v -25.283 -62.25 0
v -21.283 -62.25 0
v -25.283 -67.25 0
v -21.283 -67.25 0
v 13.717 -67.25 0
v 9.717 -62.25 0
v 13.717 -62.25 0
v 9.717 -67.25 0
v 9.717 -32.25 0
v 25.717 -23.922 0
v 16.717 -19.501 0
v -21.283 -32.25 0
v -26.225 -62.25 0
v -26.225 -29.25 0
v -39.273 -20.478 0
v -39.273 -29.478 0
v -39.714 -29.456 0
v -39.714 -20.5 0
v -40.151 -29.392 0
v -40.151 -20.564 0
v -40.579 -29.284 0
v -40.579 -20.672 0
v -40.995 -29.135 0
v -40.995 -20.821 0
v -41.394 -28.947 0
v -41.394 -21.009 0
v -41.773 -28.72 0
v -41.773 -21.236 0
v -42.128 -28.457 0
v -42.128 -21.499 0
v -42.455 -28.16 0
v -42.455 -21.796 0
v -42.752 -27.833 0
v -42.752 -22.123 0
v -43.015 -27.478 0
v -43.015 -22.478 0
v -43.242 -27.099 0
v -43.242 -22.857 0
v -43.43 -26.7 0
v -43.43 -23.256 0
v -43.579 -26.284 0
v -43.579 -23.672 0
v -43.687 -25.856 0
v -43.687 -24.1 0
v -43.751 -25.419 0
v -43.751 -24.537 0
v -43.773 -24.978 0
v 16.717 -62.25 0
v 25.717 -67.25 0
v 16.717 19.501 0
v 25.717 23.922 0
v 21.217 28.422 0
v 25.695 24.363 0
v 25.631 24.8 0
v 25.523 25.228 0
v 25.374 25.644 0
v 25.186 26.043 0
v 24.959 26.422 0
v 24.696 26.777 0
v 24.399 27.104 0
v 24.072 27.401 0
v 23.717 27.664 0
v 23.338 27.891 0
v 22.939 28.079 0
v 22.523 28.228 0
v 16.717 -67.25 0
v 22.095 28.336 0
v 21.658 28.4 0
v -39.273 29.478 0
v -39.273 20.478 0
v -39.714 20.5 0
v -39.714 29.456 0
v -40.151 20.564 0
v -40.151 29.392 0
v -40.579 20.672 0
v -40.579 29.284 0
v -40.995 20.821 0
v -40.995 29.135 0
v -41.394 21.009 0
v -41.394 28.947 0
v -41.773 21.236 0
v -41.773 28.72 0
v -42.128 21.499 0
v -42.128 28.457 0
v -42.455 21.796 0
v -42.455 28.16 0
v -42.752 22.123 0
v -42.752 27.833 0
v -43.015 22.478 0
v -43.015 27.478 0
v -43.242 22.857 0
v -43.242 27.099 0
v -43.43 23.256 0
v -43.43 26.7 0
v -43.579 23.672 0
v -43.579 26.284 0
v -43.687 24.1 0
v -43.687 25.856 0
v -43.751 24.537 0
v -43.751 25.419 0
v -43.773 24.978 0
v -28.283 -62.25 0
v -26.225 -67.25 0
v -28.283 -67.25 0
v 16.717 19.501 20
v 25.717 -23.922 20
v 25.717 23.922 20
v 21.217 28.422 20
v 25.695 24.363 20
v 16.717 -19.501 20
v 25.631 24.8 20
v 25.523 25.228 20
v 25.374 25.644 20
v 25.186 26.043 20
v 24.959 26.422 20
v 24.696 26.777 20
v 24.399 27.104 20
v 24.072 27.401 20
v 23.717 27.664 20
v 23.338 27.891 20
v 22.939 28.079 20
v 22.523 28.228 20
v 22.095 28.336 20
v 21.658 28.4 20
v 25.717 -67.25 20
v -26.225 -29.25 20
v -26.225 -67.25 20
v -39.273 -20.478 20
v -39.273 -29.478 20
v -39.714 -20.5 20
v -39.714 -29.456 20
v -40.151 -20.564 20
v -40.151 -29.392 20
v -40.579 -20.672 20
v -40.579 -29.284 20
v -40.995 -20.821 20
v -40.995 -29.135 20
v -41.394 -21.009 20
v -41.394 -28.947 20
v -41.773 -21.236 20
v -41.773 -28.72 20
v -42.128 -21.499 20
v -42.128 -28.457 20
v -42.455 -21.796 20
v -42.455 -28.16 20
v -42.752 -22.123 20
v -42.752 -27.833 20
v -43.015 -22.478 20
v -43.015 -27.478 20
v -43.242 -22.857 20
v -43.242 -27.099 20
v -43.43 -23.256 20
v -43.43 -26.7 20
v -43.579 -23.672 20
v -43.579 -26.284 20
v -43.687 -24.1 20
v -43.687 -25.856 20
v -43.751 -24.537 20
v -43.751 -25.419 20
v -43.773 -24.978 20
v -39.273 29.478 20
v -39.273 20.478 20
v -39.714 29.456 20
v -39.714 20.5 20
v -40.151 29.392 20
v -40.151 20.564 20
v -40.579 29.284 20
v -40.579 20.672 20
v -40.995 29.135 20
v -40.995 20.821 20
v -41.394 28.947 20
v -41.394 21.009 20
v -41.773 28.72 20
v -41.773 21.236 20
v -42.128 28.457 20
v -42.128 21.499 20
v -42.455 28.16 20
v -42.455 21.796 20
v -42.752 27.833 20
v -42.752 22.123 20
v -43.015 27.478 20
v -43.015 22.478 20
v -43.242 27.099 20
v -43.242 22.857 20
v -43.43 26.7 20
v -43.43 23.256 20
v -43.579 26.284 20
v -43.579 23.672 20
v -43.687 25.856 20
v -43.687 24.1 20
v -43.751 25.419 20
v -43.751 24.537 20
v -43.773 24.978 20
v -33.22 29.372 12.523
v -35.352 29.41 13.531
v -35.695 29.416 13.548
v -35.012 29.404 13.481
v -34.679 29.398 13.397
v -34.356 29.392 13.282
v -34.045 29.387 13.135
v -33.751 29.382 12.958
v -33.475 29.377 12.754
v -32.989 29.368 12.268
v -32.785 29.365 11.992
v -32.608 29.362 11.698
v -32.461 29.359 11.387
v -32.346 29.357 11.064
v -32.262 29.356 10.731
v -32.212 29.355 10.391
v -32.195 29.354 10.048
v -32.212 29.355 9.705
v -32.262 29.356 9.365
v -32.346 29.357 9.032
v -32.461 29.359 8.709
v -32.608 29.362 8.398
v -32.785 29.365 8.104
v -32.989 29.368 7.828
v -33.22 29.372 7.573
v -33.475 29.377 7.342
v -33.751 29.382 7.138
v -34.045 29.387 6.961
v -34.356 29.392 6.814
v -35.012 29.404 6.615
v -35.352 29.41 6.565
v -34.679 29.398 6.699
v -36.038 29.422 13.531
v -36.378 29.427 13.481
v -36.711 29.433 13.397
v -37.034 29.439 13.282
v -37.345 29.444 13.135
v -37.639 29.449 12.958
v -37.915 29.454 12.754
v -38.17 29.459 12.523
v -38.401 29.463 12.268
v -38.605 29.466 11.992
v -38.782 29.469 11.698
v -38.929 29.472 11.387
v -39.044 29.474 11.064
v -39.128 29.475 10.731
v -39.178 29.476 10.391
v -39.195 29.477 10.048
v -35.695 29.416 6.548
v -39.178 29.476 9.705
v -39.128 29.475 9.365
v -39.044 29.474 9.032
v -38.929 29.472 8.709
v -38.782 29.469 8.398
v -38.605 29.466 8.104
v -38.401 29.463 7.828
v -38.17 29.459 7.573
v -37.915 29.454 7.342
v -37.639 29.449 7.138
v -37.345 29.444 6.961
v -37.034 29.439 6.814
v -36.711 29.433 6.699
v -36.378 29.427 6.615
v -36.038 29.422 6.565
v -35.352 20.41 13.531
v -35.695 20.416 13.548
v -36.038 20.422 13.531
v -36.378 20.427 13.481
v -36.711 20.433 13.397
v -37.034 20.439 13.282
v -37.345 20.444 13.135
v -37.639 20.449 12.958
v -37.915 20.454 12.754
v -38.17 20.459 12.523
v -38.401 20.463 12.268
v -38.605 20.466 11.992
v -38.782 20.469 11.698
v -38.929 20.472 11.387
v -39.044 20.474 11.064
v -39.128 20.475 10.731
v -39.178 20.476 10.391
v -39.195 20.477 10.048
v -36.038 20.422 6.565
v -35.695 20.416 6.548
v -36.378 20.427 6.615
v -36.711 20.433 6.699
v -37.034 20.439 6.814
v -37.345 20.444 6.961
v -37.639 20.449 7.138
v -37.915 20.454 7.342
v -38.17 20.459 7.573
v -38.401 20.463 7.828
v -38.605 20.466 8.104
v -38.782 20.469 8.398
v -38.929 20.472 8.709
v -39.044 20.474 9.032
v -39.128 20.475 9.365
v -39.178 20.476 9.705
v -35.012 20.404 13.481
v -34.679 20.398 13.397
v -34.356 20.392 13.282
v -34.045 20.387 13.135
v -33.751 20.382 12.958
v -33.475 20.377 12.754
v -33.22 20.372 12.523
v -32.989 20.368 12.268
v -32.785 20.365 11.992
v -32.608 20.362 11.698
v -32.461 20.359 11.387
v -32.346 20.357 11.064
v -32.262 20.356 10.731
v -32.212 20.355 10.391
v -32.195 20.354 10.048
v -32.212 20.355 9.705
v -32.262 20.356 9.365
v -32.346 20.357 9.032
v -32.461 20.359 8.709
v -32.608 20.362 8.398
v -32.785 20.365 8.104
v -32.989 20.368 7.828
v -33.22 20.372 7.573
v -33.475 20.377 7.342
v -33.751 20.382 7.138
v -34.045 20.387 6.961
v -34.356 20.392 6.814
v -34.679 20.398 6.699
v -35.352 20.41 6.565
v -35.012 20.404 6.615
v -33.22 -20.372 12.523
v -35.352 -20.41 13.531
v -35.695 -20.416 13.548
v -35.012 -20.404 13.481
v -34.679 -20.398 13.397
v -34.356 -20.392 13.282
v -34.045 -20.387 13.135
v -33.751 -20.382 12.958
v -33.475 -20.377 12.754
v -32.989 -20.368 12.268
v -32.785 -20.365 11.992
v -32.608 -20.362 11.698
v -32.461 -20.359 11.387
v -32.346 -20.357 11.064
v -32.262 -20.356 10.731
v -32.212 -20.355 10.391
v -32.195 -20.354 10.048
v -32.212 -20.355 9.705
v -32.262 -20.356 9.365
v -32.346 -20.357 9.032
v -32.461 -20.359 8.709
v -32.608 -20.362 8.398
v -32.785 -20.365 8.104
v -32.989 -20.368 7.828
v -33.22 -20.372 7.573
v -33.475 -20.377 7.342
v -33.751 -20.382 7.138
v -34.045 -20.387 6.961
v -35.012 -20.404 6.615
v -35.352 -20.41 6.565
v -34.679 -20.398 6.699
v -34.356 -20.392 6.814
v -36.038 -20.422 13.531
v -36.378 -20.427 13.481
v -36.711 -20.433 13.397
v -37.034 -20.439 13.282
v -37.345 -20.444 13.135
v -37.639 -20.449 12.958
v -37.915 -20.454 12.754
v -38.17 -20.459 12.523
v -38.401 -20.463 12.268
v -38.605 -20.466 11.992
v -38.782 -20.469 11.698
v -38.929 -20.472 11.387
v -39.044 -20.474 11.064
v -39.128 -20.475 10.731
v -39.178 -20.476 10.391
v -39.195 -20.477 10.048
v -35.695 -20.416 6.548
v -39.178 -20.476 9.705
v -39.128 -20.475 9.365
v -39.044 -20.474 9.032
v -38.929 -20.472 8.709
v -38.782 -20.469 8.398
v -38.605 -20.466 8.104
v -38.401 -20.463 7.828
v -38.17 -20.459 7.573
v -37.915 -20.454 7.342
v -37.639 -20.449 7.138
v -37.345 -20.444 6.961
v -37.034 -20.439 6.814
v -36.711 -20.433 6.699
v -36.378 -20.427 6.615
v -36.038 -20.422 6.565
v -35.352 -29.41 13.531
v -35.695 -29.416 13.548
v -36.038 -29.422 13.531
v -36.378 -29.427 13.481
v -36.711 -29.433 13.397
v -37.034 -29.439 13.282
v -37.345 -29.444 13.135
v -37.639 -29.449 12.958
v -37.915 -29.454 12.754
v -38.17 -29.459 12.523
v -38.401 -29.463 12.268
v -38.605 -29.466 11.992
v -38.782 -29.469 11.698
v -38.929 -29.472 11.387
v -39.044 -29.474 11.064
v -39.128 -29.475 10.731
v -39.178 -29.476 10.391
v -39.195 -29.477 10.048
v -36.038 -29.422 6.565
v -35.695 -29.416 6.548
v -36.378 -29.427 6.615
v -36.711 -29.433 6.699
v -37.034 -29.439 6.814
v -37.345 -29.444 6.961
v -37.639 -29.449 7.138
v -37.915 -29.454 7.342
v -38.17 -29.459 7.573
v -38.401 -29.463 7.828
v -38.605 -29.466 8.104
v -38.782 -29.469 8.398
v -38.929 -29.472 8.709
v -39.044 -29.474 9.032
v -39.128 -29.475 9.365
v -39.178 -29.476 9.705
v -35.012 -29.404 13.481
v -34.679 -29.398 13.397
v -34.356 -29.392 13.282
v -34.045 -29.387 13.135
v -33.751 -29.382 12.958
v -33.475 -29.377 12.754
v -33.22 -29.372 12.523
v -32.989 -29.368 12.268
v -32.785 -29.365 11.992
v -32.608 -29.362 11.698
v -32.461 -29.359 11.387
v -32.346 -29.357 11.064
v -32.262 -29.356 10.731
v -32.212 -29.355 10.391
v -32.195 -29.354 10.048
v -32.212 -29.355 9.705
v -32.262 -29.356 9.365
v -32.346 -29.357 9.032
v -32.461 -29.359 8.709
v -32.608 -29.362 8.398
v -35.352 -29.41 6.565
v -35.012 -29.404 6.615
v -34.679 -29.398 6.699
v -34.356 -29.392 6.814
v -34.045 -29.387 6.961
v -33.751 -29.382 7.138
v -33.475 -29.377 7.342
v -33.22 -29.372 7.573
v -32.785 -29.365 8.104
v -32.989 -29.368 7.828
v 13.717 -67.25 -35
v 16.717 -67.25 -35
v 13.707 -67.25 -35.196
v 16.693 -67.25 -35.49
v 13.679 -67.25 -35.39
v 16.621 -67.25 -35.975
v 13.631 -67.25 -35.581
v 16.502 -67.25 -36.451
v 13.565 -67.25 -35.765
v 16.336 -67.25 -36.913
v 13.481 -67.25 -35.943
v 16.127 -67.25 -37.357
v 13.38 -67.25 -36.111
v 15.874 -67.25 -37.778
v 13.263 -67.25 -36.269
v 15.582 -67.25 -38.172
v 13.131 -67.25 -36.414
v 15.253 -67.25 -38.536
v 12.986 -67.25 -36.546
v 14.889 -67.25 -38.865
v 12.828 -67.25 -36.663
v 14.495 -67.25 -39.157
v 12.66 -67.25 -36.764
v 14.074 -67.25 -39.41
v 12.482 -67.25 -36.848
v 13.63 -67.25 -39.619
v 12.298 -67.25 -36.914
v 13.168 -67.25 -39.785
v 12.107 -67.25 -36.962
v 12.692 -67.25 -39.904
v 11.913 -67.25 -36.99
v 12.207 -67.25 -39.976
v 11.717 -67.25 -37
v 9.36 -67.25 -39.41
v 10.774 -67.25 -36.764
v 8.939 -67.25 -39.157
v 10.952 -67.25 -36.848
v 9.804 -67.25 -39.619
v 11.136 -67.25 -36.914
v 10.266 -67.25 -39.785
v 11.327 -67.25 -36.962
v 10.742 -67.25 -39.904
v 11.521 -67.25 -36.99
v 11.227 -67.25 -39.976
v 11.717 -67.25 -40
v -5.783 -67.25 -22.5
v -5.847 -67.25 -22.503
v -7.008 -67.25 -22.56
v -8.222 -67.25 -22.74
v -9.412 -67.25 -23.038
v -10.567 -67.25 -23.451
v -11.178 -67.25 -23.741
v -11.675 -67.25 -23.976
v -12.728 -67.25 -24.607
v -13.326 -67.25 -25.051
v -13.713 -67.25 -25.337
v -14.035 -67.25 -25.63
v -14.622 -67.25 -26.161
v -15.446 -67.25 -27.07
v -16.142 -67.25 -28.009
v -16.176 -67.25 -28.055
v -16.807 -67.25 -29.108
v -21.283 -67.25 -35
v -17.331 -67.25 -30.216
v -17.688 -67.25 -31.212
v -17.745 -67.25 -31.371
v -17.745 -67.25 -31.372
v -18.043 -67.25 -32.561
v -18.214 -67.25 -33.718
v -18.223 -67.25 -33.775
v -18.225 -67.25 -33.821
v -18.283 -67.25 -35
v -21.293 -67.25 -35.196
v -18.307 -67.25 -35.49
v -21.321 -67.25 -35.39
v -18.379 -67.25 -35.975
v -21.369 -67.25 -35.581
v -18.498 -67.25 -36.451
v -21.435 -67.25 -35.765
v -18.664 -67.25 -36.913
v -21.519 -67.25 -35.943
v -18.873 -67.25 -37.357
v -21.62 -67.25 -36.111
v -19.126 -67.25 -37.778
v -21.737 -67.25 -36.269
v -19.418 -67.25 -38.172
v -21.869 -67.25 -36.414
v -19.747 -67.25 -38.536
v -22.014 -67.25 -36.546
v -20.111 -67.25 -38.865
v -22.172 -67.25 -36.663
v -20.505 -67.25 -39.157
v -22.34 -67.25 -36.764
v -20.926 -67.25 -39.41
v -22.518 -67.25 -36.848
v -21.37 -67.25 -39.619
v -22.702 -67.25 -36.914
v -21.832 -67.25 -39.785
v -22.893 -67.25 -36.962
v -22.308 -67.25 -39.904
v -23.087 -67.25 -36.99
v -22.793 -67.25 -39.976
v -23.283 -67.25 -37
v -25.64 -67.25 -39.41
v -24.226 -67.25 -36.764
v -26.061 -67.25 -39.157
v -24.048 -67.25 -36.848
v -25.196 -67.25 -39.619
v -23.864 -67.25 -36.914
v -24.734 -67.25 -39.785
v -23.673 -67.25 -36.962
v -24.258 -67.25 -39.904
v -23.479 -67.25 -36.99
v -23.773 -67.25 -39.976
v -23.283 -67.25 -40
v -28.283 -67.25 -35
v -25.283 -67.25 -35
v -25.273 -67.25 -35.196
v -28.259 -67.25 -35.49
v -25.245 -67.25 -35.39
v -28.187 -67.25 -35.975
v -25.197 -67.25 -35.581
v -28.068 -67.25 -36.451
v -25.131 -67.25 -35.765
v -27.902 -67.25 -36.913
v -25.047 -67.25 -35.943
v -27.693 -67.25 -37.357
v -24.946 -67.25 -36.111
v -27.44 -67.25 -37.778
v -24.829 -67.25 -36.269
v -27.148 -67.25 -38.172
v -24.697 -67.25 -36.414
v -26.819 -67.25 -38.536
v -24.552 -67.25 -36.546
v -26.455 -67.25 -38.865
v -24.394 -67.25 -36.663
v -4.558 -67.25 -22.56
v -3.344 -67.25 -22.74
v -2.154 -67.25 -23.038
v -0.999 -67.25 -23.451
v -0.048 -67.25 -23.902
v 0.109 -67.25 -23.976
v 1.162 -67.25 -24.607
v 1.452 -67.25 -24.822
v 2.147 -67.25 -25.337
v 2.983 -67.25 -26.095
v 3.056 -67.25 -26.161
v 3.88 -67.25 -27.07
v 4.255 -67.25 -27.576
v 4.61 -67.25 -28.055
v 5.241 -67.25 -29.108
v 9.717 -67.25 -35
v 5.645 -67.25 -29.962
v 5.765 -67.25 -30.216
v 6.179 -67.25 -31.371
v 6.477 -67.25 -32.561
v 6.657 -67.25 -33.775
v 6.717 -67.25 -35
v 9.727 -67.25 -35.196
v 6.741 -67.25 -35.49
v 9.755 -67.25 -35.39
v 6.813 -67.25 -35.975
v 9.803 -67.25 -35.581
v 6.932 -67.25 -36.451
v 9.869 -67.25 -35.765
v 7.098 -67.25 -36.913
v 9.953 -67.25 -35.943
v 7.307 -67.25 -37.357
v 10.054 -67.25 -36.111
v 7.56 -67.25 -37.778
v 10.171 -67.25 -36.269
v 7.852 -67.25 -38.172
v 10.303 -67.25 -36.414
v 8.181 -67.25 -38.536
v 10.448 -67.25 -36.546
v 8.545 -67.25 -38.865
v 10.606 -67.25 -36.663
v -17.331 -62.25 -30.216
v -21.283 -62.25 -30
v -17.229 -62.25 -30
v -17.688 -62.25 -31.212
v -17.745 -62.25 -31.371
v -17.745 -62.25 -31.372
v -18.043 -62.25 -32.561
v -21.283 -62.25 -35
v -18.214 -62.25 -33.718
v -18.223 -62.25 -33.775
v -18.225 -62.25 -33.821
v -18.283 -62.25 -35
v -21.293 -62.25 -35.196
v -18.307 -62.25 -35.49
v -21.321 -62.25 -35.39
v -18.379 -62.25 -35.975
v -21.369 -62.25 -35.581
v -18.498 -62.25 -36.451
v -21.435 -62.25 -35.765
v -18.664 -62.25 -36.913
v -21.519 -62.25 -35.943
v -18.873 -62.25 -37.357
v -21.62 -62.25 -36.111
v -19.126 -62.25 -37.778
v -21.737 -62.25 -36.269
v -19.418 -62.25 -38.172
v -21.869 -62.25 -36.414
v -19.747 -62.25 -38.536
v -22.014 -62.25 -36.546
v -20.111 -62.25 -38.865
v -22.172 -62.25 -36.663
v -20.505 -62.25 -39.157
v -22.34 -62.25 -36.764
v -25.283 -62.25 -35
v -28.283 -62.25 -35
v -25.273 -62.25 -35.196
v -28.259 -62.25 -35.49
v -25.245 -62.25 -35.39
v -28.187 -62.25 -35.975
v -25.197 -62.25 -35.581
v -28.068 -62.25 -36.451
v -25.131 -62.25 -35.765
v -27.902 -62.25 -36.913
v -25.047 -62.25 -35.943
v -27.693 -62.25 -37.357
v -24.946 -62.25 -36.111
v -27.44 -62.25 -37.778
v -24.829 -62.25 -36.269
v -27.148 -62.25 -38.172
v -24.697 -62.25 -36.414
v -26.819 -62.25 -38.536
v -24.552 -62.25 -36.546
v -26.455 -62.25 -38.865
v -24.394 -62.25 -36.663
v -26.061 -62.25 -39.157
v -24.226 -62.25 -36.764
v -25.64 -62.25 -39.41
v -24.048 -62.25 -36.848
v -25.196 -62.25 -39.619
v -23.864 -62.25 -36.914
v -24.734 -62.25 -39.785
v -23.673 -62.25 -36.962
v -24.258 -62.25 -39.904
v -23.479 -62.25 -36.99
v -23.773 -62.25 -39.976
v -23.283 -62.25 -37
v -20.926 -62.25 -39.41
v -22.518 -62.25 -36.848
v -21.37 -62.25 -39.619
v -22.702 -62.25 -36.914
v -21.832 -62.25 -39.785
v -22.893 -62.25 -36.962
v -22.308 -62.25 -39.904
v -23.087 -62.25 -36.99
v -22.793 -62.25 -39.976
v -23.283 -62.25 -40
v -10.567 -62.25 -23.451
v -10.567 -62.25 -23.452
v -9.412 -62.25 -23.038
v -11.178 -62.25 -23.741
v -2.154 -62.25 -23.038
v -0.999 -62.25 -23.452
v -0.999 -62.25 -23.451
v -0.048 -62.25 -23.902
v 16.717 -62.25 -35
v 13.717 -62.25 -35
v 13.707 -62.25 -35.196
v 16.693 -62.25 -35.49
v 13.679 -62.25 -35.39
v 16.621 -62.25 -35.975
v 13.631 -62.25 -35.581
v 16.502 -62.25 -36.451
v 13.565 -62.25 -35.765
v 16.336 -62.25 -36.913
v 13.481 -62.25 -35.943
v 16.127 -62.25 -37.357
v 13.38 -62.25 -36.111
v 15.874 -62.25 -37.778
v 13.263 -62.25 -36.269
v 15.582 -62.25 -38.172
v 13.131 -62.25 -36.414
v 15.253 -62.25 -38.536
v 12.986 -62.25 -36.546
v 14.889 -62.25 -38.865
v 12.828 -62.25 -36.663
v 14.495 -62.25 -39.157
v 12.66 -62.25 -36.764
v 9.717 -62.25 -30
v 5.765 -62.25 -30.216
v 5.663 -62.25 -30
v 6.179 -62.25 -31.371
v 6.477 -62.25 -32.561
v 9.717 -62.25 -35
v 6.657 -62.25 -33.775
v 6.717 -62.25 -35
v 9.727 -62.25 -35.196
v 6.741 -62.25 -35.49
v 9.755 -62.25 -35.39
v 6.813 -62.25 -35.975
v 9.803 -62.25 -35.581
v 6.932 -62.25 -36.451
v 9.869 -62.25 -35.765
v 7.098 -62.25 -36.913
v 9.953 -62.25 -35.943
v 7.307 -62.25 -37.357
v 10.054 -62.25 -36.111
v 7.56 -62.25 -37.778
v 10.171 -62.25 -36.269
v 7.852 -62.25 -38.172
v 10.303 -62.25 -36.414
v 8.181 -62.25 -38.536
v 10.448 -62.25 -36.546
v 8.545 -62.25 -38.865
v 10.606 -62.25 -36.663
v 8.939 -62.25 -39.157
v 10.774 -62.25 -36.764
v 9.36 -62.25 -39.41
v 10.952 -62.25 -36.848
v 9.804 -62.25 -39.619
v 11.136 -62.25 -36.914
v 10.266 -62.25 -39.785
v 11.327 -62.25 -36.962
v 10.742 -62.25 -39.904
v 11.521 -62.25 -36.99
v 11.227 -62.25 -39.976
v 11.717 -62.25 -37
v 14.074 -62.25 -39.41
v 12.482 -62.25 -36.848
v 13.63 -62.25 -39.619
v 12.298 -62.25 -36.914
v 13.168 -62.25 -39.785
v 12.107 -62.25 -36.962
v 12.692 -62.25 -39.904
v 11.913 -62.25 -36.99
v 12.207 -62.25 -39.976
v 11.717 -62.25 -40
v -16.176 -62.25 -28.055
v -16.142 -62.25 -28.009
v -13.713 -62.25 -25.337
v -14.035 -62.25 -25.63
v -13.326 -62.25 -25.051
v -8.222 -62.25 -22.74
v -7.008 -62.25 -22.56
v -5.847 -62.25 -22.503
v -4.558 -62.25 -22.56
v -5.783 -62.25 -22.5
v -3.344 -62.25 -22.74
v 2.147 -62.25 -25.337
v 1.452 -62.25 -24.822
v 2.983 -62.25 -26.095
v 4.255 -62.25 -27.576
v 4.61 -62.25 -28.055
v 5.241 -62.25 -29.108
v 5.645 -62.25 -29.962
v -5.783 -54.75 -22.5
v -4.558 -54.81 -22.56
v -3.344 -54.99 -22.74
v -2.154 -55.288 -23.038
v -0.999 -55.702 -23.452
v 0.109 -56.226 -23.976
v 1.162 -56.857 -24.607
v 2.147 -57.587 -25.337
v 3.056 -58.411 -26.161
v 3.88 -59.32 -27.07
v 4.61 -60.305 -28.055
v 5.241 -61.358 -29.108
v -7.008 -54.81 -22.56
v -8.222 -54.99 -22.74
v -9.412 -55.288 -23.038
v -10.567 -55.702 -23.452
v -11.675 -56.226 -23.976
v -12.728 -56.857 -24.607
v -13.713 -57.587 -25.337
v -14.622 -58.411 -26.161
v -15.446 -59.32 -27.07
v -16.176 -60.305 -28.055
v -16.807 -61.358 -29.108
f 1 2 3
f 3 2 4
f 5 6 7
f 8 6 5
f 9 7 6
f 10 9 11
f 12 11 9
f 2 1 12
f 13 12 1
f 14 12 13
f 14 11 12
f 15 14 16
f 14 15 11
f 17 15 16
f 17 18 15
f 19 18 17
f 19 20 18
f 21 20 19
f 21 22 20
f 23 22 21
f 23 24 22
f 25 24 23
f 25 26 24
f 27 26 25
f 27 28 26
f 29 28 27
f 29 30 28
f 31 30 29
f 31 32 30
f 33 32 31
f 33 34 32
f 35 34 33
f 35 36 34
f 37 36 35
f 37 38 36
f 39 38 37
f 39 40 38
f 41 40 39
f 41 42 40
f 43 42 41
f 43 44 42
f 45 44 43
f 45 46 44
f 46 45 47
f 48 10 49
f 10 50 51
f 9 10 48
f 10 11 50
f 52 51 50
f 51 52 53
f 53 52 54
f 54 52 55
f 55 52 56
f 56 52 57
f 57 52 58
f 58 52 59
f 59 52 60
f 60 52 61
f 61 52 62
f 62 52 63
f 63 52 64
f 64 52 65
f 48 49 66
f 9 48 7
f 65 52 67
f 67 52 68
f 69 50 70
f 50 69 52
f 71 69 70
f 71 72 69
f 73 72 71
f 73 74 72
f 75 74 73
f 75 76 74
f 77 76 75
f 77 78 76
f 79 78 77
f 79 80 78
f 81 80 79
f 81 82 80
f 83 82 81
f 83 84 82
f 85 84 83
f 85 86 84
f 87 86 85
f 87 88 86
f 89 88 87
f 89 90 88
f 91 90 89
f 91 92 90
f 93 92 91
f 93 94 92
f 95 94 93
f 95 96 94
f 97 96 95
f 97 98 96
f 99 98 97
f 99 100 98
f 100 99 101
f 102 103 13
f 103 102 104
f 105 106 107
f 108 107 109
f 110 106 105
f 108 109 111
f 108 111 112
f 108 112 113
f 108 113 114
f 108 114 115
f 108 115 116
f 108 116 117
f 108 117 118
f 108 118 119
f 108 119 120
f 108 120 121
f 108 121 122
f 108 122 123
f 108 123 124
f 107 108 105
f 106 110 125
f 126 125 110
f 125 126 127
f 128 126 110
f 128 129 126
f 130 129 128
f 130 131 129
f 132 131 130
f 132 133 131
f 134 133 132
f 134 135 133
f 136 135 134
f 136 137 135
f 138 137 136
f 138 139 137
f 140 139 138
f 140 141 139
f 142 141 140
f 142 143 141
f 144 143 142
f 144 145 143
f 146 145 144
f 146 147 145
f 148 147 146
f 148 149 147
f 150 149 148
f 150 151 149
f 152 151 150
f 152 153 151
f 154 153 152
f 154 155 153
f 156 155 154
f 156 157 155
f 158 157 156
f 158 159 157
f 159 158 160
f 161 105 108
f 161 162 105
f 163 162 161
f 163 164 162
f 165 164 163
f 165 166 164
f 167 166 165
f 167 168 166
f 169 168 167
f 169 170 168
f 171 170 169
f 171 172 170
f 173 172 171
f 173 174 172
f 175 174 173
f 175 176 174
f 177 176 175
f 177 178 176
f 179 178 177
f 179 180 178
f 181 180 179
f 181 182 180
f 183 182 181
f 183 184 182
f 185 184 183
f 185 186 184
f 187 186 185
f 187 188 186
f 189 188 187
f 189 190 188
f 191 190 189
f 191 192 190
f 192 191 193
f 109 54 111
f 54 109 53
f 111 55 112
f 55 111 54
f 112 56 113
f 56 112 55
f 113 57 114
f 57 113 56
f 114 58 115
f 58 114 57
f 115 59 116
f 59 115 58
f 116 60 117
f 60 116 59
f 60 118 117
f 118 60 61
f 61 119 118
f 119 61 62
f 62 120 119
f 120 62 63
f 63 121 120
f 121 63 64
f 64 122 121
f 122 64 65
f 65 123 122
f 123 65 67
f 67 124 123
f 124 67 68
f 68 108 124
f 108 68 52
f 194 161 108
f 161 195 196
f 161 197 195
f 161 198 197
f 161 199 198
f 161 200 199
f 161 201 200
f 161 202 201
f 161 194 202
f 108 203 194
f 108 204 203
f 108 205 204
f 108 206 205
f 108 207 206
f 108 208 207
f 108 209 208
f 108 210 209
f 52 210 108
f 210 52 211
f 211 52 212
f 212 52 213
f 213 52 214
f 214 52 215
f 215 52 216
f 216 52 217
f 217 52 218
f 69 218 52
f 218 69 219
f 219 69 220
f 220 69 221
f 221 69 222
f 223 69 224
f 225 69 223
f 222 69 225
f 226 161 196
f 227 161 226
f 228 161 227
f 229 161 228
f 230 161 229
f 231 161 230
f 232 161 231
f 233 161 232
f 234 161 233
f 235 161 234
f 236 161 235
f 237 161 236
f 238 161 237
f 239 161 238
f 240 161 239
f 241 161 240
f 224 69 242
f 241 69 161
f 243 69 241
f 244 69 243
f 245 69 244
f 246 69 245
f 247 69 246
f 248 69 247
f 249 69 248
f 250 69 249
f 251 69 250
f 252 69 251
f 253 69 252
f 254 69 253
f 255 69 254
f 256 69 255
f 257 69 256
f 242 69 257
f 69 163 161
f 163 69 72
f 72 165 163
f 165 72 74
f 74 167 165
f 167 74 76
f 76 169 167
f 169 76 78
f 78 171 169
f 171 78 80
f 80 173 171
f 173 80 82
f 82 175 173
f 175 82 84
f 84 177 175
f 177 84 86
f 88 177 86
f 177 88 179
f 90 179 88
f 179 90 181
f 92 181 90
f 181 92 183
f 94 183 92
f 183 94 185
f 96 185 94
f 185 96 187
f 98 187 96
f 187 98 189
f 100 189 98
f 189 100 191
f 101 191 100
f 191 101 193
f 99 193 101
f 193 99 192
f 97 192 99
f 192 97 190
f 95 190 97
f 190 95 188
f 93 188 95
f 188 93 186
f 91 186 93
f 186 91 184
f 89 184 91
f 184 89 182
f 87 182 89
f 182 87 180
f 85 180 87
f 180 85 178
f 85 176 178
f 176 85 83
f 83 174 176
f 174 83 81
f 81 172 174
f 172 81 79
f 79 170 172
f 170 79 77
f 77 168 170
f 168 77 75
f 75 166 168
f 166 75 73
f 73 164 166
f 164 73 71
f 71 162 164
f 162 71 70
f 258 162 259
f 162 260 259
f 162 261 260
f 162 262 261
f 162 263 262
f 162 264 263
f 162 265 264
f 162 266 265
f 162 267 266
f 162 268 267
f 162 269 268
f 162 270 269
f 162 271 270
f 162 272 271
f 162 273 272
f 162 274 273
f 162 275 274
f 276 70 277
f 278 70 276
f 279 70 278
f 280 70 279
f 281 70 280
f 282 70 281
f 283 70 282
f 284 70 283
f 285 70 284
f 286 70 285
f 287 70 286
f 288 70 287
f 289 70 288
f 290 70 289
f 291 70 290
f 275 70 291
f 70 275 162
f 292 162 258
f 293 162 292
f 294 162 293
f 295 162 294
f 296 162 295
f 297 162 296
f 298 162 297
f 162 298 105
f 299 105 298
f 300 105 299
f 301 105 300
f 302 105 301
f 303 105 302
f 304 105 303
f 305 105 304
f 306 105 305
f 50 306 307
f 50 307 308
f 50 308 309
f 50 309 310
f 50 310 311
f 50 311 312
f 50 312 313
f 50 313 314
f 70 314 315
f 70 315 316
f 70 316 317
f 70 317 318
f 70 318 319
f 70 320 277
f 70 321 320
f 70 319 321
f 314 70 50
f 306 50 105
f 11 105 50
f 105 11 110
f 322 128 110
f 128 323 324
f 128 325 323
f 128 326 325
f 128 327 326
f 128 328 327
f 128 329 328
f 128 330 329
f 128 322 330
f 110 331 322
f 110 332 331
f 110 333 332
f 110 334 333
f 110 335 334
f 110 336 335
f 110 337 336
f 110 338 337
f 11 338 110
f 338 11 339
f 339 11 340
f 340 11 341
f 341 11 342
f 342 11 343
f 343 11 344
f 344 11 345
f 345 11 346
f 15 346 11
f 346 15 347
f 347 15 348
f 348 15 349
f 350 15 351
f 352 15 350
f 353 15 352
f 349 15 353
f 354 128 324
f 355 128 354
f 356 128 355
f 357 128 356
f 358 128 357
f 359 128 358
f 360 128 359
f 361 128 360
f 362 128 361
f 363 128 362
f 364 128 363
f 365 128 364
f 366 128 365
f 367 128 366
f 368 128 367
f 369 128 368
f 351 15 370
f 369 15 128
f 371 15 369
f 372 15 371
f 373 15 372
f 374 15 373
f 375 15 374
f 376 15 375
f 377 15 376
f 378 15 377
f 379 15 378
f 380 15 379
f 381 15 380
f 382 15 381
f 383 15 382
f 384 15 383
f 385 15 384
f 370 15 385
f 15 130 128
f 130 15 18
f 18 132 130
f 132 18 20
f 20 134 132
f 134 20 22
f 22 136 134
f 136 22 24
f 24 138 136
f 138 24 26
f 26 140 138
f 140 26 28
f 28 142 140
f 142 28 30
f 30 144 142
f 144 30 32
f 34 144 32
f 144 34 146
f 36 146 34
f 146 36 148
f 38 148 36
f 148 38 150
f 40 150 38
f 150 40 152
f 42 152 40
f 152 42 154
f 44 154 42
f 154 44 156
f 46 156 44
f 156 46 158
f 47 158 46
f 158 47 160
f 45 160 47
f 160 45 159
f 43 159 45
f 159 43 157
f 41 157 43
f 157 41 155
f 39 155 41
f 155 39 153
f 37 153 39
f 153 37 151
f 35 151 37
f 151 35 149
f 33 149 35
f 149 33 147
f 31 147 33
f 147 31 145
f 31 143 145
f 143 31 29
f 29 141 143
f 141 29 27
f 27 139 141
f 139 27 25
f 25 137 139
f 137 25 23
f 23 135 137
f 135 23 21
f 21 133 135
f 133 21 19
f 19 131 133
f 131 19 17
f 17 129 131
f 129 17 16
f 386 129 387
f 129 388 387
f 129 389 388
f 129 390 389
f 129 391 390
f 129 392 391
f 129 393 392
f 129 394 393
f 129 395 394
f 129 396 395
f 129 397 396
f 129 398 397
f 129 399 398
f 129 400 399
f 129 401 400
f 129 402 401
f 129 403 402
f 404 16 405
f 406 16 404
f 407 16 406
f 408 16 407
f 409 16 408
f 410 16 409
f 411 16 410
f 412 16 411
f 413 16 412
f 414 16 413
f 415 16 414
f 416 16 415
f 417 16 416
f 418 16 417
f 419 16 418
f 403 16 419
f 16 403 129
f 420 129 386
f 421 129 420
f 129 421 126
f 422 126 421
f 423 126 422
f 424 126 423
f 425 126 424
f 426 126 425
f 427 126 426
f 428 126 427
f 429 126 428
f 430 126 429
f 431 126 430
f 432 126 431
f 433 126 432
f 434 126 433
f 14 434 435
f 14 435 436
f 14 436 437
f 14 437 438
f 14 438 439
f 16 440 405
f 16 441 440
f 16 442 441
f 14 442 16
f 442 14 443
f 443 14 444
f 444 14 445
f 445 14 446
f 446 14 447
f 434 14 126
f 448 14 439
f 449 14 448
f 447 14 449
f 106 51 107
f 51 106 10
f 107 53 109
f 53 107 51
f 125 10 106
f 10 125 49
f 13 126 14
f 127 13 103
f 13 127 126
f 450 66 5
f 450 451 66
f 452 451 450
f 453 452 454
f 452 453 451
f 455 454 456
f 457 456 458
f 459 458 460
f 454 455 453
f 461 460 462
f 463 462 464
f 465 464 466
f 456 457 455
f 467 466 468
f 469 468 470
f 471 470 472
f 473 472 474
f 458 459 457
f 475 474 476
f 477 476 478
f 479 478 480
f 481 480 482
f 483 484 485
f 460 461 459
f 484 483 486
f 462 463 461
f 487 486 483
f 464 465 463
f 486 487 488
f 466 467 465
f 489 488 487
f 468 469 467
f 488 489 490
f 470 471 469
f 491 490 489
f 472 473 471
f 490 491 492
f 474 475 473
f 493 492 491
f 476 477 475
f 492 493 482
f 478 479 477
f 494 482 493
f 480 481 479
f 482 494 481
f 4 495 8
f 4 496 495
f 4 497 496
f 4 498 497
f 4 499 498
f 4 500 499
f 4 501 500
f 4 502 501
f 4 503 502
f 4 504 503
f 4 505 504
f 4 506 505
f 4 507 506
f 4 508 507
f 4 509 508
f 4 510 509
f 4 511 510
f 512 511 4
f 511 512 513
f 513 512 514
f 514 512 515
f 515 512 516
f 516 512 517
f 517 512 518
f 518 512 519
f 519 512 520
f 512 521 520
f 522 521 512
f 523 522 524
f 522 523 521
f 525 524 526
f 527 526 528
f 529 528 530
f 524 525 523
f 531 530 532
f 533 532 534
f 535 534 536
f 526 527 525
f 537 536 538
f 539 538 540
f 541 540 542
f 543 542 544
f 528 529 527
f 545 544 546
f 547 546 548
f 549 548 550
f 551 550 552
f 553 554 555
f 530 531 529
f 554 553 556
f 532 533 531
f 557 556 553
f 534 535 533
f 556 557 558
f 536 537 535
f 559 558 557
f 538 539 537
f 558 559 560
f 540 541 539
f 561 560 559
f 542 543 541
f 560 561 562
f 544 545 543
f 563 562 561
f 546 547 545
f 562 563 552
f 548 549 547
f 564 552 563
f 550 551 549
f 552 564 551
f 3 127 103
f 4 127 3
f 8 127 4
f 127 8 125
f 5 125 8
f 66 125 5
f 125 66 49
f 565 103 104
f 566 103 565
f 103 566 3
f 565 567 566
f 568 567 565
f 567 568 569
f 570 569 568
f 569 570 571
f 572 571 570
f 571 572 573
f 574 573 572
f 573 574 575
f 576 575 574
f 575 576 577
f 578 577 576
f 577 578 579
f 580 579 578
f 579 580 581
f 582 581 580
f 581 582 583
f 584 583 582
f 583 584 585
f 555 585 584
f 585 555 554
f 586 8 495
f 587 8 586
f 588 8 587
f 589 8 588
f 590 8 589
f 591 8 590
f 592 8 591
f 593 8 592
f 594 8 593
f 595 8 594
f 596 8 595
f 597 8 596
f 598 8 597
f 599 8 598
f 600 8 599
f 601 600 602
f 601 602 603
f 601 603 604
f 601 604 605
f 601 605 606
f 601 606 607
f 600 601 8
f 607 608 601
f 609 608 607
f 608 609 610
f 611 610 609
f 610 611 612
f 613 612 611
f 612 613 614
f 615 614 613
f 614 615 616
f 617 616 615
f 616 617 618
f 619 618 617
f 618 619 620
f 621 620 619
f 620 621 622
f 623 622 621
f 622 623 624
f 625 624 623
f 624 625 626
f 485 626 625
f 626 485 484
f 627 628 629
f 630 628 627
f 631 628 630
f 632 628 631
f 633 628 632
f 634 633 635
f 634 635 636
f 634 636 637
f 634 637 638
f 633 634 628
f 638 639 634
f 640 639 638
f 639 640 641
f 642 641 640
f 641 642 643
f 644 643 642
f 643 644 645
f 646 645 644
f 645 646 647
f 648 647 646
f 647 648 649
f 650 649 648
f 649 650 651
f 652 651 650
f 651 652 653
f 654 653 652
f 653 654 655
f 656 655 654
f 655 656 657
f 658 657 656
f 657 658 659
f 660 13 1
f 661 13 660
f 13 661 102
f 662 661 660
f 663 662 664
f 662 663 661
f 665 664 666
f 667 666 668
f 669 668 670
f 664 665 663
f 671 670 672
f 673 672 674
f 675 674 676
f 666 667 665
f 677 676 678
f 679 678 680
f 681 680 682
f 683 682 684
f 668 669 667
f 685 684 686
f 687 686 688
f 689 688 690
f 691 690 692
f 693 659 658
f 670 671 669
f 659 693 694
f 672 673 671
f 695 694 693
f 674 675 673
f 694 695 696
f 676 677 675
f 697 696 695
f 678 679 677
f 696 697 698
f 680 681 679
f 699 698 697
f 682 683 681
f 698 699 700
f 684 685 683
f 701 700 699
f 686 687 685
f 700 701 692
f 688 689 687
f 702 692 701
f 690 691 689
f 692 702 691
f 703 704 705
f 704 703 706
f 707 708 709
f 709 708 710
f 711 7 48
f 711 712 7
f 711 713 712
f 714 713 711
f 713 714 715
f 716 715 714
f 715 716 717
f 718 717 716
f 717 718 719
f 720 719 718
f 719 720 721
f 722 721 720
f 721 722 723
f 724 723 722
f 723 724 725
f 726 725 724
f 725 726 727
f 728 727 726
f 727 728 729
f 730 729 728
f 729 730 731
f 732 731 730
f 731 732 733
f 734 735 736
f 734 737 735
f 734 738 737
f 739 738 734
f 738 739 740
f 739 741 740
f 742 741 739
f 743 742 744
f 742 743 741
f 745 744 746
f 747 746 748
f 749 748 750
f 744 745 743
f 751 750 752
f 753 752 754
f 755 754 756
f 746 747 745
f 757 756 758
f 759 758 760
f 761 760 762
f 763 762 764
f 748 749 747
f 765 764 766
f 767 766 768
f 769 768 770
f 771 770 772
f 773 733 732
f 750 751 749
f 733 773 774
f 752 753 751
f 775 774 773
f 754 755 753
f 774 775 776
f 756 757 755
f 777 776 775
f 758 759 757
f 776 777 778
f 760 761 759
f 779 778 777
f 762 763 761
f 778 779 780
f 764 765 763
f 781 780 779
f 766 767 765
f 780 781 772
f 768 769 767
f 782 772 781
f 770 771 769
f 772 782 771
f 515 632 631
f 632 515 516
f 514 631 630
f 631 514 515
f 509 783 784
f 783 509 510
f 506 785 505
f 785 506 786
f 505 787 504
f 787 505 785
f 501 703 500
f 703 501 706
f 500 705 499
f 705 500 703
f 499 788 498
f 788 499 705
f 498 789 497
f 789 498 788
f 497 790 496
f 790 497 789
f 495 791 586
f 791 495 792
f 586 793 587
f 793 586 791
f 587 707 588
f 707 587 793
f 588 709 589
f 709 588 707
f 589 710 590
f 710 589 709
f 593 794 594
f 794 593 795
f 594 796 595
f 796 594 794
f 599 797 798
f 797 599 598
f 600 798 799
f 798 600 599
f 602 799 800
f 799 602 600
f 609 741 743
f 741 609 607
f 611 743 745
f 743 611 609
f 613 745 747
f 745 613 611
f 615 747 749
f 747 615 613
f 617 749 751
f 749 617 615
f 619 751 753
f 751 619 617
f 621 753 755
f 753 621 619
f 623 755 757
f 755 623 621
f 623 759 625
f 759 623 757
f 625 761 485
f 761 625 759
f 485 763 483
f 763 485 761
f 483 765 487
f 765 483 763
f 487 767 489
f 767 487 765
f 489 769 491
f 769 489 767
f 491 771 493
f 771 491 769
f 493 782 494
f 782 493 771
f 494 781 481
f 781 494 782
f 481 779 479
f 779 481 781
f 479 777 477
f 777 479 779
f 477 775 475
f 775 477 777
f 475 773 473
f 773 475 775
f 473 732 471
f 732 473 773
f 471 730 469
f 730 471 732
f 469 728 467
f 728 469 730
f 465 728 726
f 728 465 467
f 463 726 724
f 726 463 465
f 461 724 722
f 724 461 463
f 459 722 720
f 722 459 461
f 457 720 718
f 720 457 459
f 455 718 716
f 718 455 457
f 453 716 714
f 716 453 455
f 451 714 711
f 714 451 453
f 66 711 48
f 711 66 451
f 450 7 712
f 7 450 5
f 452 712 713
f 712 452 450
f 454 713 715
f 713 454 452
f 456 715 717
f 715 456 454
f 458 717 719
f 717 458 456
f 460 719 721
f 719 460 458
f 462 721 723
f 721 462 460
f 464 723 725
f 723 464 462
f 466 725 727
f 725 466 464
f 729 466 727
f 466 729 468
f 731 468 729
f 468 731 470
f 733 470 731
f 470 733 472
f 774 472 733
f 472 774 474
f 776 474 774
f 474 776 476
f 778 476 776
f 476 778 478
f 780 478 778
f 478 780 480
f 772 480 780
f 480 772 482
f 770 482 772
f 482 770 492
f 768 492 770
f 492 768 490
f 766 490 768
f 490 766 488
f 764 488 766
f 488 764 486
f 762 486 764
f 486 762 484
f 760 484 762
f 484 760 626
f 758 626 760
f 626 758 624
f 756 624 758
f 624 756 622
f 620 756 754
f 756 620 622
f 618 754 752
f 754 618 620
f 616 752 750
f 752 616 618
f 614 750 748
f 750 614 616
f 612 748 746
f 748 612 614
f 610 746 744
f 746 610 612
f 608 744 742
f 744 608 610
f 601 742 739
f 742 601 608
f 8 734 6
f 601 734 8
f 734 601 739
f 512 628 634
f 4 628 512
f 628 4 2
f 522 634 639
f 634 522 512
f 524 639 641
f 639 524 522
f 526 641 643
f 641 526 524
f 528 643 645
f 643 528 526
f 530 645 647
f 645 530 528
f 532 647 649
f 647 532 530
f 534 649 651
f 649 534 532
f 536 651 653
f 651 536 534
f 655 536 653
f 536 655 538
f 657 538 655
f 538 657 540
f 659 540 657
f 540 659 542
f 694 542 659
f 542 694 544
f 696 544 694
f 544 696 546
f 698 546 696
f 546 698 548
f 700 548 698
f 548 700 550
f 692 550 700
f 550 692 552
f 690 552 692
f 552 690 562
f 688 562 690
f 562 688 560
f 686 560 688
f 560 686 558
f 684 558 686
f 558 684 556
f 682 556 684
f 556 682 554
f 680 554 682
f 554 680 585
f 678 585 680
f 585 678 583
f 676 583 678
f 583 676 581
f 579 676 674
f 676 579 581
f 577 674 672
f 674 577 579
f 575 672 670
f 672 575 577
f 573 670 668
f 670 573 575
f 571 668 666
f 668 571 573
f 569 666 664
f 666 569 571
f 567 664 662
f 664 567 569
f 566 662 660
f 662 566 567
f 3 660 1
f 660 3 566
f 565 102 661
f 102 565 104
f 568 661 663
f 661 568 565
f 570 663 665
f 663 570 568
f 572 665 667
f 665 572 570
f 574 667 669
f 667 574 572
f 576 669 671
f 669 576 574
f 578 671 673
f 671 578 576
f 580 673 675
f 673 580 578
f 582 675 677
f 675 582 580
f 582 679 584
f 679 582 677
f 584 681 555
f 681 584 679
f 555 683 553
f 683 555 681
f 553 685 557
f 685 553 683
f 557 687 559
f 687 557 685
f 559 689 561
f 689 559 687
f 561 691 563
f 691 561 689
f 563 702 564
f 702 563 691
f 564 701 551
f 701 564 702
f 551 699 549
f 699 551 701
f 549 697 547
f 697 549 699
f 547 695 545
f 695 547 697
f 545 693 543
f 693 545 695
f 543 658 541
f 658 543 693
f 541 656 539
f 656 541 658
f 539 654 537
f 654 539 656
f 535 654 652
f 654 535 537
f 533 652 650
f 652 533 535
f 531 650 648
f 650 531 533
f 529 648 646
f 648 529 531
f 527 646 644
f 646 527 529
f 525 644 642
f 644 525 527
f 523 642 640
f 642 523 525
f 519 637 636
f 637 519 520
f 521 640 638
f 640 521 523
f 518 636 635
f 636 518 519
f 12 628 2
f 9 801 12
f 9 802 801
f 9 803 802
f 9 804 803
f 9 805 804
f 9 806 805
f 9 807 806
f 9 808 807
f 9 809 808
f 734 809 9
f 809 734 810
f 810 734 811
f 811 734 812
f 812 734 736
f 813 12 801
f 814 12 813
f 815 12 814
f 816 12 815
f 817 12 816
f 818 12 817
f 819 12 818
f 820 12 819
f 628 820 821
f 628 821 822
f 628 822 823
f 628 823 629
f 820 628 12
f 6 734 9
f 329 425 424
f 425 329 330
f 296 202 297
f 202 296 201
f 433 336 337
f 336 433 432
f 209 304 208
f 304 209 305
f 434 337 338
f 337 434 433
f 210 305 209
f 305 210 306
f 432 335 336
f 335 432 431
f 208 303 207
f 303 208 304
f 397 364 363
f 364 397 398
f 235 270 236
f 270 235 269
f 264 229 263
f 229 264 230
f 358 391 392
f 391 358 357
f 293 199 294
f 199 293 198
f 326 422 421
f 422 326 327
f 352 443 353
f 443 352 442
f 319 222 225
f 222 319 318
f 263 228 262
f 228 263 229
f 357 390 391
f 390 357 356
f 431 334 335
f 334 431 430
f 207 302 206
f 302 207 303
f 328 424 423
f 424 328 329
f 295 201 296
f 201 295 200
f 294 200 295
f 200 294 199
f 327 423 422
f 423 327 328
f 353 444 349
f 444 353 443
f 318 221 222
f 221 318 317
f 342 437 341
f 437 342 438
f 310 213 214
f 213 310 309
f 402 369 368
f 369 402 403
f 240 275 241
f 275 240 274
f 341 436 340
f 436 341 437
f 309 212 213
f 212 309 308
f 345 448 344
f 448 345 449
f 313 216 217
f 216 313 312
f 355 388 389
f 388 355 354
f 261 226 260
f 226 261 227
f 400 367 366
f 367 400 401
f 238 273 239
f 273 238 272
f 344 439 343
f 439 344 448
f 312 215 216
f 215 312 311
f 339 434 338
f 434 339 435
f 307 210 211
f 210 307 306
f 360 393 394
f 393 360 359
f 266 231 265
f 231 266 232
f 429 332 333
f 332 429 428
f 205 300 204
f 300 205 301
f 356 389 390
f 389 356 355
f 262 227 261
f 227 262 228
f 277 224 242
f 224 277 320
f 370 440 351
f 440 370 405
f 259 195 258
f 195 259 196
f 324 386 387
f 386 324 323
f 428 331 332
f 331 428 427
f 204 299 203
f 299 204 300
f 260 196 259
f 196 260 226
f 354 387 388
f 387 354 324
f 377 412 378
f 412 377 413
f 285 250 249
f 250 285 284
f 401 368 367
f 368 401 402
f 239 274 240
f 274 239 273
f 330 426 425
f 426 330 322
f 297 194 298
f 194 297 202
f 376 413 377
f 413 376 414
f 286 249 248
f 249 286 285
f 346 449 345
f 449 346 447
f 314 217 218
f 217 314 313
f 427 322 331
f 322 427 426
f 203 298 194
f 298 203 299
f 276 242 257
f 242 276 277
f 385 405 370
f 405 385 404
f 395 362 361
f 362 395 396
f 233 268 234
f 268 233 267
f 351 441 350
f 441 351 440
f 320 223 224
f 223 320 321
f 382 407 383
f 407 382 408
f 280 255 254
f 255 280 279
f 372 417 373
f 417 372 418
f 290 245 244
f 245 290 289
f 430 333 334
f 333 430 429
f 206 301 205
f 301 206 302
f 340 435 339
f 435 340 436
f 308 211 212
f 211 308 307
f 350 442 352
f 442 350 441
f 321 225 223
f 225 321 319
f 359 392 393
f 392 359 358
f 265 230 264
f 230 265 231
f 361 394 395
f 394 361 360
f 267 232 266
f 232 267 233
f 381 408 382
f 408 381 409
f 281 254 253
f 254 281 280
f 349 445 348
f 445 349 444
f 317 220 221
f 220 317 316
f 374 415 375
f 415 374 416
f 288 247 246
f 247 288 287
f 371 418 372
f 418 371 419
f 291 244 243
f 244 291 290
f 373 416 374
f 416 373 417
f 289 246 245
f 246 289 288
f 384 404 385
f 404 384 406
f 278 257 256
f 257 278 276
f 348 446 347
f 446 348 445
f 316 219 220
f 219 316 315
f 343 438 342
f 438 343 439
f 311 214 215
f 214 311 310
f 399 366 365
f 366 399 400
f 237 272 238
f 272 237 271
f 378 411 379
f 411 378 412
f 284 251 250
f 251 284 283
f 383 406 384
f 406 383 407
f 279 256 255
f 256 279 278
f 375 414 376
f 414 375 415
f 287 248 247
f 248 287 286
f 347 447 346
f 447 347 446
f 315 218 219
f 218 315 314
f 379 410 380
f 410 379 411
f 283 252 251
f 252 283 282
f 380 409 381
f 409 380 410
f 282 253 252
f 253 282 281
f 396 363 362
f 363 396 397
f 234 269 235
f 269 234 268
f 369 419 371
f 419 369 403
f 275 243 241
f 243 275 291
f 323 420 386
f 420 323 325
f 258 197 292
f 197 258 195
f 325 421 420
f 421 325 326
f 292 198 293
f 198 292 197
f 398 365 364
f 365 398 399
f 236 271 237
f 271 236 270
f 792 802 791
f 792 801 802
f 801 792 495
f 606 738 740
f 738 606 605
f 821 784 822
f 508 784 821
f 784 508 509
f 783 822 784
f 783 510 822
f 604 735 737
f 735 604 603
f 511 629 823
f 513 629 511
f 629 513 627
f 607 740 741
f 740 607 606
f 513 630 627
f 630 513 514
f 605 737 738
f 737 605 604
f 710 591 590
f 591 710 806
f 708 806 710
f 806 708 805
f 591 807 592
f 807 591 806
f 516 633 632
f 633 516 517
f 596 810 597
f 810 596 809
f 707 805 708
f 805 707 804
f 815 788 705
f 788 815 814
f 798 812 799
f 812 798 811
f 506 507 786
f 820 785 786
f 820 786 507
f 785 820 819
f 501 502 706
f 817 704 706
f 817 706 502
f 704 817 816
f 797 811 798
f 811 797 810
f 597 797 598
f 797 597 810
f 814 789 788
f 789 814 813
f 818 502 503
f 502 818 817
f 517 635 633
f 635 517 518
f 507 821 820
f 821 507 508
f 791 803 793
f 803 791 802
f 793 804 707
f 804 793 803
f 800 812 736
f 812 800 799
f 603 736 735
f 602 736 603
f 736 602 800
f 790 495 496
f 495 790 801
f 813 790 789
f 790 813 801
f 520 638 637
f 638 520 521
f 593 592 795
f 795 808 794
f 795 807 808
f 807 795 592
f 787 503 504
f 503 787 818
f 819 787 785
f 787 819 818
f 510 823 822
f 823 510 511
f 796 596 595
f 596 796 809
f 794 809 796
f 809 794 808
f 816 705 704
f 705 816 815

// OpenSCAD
// ---------------------------------------------------------------------------
// bracket2.scad  -  BEST-EFFORT reconstruction of Onshape part studio "bracket2"
// Coordinates are identical to Onshape (Z up, Top plane = XY, Front plane = XZ),
// so you can overlay the exported reference mesh with  show_reference = true.
//
// Built from the Onshape feature tree (see ../bracket2/feature_tree.txt):
//   1. C-clamp ring  : Sketch 1 (Top) slot path, width #thick = 9, mirrored about XZ,
//                      arms tilted by #angcomp = 1 deg, extruded 20 mm  (z 0..20)
//   2. Block         : Sketch 3 (Top) region x -26.225..25.717, y -67.25..arm, z 0..20
//   3. Motor plate   : Sketch 4 on face y = -67.25, 5 mm thick, two slots 4 mm wide
//                      (10 mm rounded ends) at 35 mm pitch for a 28BYJ-48, D25 cut-out
//   4. Gusset        : Chamfer 2, 30 mm x 45 deg on the concave plate/block edge
//   5. Clamp holes   : Sketch 2 (Front) D7 at x -35.695, z 10.048, through both arm tips
//                      (Onshape cuts these with bodies derived from "screw_long" -
//                       check the STEP for thread / head pocket details)
// Things NOT verified: exact hole geometry (thread / pocket), small edge chamfers.
// ---------------------------------------------------------------------------

show_reference = false;     // true: ghost-overlay the exported Onshape mesh
thick   = 9;                // #thick
angcomp = 1;                // #angcomp (deg) - arm tilt (spring pre-load)
ring_h  = 20;               // Extrude 1 depth

// slot-path centre points (Sketch 1, half - mirrored about y = 0)
back_x   = 21.217;          // centre line of back wall (outer face x = 25.717)
corner_y = 23.922;
tip      = [-39.273, 24.978];   // arm tip cap centre (65 mm from back wall, 1 deg tilt)

// motor plate (Sketch 4, plane y = -67.25, sketch X = world X, sketch Y = world Z)
plate_y0  = -67.25;
plate_t   = 5;
motor_cx  = -5.783;         // mirror line / motor cut-out centre x
slot_dx   = 17.5;           // 35 mm hole pitch / 2
slot_len  = 35;             // slot centre distance (z 0 .. -35)
cutout_d  = 25;

$fn = 64;

module slot2d(a, b, w) hull() { translate(a) circle(d = w); translate(b) circle(d = w); }

module c_ring() {
    linear_extrude(ring_h) for (m = [0, 1]) mirror([0, m, 0]) {
        slot2d([back_x, 0], [back_x, corner_y], thick);
        slot2d([back_x, corner_y], tip, thick);
    }
}

module block() {
    // region between the -Y arm and the plate face (Sketch 3 -> Extrude 2 up to top face)
    translate([-26.225, plate_y0, 0]) cube([25.717 + 26.225, (-corner_y) - plate_y0, ring_h]);
}

module plate2d() {   // in sketch coords: X = world X, Y = world Z
    difference() {
        union() {
            for (s = [-1, 1]) slot2d([motor_cx + s * slot_dx, 0], [motor_cx + s * slot_dx, -slot_len], 10);
            translate([motor_cx - slot_dx, -slot_len]) square([2 * slot_dx, slot_len]);
        }
        for (s = [-1, 1]) slot2d([motor_cx + s * slot_dx, 0], [motor_cx + s * slot_dx, -slot_len], 4);
        translate([motor_cx, -slot_len]) circle(d = cutout_d);
        translate([-100, 0]) square([200, 50]);           // clip slot caps above z = 0
    }
}

module plate() {
    // sketch plane y = -67.25, extruded 5 mm towards +Y
    translate([0, plate_y0, 0]) rotate([90, 0, 0]) mirror([0, 0, 1]) linear_extrude(plate_t) plate2d();
}

module gusset() {
    // 30 x 30 mm 45 deg fill between the inner plate face and the block bottom,
    // between the two 4 mm slots
    x0 = motor_cx - slot_dx + 2; x1 = motor_cx + slot_dx - 2;
    translate([x0, plate_y0 + plate_t, 0]) rotate([90, 0, 90])
        linear_extrude(x1 - x0) polygon([[0, 0], [30, 0], [0, -30]]);
}

module motor_cutout() {   // D25 cut-out, also trims the gusset (as seen in Onshape back view)
    translate([motor_cx, plate_y0 - 1, -slot_len]) rotate([-90, 0, 0]) cylinder(d = cutout_d, h = 40);
}

module clamp_holes() {
    translate([-35.695, 0, 10.048]) rotate([90, 0, 0]) cylinder(d = 7, h = 80, center = true);
}

module bracket2() {
    difference() {
        union() { c_ring(); block(); plate(); gusset(); }
        clamp_holes();
        motor_cutout();
    }
}

bracket2();
if (show_reference) %import("../bracket2/bracket2.stl");
